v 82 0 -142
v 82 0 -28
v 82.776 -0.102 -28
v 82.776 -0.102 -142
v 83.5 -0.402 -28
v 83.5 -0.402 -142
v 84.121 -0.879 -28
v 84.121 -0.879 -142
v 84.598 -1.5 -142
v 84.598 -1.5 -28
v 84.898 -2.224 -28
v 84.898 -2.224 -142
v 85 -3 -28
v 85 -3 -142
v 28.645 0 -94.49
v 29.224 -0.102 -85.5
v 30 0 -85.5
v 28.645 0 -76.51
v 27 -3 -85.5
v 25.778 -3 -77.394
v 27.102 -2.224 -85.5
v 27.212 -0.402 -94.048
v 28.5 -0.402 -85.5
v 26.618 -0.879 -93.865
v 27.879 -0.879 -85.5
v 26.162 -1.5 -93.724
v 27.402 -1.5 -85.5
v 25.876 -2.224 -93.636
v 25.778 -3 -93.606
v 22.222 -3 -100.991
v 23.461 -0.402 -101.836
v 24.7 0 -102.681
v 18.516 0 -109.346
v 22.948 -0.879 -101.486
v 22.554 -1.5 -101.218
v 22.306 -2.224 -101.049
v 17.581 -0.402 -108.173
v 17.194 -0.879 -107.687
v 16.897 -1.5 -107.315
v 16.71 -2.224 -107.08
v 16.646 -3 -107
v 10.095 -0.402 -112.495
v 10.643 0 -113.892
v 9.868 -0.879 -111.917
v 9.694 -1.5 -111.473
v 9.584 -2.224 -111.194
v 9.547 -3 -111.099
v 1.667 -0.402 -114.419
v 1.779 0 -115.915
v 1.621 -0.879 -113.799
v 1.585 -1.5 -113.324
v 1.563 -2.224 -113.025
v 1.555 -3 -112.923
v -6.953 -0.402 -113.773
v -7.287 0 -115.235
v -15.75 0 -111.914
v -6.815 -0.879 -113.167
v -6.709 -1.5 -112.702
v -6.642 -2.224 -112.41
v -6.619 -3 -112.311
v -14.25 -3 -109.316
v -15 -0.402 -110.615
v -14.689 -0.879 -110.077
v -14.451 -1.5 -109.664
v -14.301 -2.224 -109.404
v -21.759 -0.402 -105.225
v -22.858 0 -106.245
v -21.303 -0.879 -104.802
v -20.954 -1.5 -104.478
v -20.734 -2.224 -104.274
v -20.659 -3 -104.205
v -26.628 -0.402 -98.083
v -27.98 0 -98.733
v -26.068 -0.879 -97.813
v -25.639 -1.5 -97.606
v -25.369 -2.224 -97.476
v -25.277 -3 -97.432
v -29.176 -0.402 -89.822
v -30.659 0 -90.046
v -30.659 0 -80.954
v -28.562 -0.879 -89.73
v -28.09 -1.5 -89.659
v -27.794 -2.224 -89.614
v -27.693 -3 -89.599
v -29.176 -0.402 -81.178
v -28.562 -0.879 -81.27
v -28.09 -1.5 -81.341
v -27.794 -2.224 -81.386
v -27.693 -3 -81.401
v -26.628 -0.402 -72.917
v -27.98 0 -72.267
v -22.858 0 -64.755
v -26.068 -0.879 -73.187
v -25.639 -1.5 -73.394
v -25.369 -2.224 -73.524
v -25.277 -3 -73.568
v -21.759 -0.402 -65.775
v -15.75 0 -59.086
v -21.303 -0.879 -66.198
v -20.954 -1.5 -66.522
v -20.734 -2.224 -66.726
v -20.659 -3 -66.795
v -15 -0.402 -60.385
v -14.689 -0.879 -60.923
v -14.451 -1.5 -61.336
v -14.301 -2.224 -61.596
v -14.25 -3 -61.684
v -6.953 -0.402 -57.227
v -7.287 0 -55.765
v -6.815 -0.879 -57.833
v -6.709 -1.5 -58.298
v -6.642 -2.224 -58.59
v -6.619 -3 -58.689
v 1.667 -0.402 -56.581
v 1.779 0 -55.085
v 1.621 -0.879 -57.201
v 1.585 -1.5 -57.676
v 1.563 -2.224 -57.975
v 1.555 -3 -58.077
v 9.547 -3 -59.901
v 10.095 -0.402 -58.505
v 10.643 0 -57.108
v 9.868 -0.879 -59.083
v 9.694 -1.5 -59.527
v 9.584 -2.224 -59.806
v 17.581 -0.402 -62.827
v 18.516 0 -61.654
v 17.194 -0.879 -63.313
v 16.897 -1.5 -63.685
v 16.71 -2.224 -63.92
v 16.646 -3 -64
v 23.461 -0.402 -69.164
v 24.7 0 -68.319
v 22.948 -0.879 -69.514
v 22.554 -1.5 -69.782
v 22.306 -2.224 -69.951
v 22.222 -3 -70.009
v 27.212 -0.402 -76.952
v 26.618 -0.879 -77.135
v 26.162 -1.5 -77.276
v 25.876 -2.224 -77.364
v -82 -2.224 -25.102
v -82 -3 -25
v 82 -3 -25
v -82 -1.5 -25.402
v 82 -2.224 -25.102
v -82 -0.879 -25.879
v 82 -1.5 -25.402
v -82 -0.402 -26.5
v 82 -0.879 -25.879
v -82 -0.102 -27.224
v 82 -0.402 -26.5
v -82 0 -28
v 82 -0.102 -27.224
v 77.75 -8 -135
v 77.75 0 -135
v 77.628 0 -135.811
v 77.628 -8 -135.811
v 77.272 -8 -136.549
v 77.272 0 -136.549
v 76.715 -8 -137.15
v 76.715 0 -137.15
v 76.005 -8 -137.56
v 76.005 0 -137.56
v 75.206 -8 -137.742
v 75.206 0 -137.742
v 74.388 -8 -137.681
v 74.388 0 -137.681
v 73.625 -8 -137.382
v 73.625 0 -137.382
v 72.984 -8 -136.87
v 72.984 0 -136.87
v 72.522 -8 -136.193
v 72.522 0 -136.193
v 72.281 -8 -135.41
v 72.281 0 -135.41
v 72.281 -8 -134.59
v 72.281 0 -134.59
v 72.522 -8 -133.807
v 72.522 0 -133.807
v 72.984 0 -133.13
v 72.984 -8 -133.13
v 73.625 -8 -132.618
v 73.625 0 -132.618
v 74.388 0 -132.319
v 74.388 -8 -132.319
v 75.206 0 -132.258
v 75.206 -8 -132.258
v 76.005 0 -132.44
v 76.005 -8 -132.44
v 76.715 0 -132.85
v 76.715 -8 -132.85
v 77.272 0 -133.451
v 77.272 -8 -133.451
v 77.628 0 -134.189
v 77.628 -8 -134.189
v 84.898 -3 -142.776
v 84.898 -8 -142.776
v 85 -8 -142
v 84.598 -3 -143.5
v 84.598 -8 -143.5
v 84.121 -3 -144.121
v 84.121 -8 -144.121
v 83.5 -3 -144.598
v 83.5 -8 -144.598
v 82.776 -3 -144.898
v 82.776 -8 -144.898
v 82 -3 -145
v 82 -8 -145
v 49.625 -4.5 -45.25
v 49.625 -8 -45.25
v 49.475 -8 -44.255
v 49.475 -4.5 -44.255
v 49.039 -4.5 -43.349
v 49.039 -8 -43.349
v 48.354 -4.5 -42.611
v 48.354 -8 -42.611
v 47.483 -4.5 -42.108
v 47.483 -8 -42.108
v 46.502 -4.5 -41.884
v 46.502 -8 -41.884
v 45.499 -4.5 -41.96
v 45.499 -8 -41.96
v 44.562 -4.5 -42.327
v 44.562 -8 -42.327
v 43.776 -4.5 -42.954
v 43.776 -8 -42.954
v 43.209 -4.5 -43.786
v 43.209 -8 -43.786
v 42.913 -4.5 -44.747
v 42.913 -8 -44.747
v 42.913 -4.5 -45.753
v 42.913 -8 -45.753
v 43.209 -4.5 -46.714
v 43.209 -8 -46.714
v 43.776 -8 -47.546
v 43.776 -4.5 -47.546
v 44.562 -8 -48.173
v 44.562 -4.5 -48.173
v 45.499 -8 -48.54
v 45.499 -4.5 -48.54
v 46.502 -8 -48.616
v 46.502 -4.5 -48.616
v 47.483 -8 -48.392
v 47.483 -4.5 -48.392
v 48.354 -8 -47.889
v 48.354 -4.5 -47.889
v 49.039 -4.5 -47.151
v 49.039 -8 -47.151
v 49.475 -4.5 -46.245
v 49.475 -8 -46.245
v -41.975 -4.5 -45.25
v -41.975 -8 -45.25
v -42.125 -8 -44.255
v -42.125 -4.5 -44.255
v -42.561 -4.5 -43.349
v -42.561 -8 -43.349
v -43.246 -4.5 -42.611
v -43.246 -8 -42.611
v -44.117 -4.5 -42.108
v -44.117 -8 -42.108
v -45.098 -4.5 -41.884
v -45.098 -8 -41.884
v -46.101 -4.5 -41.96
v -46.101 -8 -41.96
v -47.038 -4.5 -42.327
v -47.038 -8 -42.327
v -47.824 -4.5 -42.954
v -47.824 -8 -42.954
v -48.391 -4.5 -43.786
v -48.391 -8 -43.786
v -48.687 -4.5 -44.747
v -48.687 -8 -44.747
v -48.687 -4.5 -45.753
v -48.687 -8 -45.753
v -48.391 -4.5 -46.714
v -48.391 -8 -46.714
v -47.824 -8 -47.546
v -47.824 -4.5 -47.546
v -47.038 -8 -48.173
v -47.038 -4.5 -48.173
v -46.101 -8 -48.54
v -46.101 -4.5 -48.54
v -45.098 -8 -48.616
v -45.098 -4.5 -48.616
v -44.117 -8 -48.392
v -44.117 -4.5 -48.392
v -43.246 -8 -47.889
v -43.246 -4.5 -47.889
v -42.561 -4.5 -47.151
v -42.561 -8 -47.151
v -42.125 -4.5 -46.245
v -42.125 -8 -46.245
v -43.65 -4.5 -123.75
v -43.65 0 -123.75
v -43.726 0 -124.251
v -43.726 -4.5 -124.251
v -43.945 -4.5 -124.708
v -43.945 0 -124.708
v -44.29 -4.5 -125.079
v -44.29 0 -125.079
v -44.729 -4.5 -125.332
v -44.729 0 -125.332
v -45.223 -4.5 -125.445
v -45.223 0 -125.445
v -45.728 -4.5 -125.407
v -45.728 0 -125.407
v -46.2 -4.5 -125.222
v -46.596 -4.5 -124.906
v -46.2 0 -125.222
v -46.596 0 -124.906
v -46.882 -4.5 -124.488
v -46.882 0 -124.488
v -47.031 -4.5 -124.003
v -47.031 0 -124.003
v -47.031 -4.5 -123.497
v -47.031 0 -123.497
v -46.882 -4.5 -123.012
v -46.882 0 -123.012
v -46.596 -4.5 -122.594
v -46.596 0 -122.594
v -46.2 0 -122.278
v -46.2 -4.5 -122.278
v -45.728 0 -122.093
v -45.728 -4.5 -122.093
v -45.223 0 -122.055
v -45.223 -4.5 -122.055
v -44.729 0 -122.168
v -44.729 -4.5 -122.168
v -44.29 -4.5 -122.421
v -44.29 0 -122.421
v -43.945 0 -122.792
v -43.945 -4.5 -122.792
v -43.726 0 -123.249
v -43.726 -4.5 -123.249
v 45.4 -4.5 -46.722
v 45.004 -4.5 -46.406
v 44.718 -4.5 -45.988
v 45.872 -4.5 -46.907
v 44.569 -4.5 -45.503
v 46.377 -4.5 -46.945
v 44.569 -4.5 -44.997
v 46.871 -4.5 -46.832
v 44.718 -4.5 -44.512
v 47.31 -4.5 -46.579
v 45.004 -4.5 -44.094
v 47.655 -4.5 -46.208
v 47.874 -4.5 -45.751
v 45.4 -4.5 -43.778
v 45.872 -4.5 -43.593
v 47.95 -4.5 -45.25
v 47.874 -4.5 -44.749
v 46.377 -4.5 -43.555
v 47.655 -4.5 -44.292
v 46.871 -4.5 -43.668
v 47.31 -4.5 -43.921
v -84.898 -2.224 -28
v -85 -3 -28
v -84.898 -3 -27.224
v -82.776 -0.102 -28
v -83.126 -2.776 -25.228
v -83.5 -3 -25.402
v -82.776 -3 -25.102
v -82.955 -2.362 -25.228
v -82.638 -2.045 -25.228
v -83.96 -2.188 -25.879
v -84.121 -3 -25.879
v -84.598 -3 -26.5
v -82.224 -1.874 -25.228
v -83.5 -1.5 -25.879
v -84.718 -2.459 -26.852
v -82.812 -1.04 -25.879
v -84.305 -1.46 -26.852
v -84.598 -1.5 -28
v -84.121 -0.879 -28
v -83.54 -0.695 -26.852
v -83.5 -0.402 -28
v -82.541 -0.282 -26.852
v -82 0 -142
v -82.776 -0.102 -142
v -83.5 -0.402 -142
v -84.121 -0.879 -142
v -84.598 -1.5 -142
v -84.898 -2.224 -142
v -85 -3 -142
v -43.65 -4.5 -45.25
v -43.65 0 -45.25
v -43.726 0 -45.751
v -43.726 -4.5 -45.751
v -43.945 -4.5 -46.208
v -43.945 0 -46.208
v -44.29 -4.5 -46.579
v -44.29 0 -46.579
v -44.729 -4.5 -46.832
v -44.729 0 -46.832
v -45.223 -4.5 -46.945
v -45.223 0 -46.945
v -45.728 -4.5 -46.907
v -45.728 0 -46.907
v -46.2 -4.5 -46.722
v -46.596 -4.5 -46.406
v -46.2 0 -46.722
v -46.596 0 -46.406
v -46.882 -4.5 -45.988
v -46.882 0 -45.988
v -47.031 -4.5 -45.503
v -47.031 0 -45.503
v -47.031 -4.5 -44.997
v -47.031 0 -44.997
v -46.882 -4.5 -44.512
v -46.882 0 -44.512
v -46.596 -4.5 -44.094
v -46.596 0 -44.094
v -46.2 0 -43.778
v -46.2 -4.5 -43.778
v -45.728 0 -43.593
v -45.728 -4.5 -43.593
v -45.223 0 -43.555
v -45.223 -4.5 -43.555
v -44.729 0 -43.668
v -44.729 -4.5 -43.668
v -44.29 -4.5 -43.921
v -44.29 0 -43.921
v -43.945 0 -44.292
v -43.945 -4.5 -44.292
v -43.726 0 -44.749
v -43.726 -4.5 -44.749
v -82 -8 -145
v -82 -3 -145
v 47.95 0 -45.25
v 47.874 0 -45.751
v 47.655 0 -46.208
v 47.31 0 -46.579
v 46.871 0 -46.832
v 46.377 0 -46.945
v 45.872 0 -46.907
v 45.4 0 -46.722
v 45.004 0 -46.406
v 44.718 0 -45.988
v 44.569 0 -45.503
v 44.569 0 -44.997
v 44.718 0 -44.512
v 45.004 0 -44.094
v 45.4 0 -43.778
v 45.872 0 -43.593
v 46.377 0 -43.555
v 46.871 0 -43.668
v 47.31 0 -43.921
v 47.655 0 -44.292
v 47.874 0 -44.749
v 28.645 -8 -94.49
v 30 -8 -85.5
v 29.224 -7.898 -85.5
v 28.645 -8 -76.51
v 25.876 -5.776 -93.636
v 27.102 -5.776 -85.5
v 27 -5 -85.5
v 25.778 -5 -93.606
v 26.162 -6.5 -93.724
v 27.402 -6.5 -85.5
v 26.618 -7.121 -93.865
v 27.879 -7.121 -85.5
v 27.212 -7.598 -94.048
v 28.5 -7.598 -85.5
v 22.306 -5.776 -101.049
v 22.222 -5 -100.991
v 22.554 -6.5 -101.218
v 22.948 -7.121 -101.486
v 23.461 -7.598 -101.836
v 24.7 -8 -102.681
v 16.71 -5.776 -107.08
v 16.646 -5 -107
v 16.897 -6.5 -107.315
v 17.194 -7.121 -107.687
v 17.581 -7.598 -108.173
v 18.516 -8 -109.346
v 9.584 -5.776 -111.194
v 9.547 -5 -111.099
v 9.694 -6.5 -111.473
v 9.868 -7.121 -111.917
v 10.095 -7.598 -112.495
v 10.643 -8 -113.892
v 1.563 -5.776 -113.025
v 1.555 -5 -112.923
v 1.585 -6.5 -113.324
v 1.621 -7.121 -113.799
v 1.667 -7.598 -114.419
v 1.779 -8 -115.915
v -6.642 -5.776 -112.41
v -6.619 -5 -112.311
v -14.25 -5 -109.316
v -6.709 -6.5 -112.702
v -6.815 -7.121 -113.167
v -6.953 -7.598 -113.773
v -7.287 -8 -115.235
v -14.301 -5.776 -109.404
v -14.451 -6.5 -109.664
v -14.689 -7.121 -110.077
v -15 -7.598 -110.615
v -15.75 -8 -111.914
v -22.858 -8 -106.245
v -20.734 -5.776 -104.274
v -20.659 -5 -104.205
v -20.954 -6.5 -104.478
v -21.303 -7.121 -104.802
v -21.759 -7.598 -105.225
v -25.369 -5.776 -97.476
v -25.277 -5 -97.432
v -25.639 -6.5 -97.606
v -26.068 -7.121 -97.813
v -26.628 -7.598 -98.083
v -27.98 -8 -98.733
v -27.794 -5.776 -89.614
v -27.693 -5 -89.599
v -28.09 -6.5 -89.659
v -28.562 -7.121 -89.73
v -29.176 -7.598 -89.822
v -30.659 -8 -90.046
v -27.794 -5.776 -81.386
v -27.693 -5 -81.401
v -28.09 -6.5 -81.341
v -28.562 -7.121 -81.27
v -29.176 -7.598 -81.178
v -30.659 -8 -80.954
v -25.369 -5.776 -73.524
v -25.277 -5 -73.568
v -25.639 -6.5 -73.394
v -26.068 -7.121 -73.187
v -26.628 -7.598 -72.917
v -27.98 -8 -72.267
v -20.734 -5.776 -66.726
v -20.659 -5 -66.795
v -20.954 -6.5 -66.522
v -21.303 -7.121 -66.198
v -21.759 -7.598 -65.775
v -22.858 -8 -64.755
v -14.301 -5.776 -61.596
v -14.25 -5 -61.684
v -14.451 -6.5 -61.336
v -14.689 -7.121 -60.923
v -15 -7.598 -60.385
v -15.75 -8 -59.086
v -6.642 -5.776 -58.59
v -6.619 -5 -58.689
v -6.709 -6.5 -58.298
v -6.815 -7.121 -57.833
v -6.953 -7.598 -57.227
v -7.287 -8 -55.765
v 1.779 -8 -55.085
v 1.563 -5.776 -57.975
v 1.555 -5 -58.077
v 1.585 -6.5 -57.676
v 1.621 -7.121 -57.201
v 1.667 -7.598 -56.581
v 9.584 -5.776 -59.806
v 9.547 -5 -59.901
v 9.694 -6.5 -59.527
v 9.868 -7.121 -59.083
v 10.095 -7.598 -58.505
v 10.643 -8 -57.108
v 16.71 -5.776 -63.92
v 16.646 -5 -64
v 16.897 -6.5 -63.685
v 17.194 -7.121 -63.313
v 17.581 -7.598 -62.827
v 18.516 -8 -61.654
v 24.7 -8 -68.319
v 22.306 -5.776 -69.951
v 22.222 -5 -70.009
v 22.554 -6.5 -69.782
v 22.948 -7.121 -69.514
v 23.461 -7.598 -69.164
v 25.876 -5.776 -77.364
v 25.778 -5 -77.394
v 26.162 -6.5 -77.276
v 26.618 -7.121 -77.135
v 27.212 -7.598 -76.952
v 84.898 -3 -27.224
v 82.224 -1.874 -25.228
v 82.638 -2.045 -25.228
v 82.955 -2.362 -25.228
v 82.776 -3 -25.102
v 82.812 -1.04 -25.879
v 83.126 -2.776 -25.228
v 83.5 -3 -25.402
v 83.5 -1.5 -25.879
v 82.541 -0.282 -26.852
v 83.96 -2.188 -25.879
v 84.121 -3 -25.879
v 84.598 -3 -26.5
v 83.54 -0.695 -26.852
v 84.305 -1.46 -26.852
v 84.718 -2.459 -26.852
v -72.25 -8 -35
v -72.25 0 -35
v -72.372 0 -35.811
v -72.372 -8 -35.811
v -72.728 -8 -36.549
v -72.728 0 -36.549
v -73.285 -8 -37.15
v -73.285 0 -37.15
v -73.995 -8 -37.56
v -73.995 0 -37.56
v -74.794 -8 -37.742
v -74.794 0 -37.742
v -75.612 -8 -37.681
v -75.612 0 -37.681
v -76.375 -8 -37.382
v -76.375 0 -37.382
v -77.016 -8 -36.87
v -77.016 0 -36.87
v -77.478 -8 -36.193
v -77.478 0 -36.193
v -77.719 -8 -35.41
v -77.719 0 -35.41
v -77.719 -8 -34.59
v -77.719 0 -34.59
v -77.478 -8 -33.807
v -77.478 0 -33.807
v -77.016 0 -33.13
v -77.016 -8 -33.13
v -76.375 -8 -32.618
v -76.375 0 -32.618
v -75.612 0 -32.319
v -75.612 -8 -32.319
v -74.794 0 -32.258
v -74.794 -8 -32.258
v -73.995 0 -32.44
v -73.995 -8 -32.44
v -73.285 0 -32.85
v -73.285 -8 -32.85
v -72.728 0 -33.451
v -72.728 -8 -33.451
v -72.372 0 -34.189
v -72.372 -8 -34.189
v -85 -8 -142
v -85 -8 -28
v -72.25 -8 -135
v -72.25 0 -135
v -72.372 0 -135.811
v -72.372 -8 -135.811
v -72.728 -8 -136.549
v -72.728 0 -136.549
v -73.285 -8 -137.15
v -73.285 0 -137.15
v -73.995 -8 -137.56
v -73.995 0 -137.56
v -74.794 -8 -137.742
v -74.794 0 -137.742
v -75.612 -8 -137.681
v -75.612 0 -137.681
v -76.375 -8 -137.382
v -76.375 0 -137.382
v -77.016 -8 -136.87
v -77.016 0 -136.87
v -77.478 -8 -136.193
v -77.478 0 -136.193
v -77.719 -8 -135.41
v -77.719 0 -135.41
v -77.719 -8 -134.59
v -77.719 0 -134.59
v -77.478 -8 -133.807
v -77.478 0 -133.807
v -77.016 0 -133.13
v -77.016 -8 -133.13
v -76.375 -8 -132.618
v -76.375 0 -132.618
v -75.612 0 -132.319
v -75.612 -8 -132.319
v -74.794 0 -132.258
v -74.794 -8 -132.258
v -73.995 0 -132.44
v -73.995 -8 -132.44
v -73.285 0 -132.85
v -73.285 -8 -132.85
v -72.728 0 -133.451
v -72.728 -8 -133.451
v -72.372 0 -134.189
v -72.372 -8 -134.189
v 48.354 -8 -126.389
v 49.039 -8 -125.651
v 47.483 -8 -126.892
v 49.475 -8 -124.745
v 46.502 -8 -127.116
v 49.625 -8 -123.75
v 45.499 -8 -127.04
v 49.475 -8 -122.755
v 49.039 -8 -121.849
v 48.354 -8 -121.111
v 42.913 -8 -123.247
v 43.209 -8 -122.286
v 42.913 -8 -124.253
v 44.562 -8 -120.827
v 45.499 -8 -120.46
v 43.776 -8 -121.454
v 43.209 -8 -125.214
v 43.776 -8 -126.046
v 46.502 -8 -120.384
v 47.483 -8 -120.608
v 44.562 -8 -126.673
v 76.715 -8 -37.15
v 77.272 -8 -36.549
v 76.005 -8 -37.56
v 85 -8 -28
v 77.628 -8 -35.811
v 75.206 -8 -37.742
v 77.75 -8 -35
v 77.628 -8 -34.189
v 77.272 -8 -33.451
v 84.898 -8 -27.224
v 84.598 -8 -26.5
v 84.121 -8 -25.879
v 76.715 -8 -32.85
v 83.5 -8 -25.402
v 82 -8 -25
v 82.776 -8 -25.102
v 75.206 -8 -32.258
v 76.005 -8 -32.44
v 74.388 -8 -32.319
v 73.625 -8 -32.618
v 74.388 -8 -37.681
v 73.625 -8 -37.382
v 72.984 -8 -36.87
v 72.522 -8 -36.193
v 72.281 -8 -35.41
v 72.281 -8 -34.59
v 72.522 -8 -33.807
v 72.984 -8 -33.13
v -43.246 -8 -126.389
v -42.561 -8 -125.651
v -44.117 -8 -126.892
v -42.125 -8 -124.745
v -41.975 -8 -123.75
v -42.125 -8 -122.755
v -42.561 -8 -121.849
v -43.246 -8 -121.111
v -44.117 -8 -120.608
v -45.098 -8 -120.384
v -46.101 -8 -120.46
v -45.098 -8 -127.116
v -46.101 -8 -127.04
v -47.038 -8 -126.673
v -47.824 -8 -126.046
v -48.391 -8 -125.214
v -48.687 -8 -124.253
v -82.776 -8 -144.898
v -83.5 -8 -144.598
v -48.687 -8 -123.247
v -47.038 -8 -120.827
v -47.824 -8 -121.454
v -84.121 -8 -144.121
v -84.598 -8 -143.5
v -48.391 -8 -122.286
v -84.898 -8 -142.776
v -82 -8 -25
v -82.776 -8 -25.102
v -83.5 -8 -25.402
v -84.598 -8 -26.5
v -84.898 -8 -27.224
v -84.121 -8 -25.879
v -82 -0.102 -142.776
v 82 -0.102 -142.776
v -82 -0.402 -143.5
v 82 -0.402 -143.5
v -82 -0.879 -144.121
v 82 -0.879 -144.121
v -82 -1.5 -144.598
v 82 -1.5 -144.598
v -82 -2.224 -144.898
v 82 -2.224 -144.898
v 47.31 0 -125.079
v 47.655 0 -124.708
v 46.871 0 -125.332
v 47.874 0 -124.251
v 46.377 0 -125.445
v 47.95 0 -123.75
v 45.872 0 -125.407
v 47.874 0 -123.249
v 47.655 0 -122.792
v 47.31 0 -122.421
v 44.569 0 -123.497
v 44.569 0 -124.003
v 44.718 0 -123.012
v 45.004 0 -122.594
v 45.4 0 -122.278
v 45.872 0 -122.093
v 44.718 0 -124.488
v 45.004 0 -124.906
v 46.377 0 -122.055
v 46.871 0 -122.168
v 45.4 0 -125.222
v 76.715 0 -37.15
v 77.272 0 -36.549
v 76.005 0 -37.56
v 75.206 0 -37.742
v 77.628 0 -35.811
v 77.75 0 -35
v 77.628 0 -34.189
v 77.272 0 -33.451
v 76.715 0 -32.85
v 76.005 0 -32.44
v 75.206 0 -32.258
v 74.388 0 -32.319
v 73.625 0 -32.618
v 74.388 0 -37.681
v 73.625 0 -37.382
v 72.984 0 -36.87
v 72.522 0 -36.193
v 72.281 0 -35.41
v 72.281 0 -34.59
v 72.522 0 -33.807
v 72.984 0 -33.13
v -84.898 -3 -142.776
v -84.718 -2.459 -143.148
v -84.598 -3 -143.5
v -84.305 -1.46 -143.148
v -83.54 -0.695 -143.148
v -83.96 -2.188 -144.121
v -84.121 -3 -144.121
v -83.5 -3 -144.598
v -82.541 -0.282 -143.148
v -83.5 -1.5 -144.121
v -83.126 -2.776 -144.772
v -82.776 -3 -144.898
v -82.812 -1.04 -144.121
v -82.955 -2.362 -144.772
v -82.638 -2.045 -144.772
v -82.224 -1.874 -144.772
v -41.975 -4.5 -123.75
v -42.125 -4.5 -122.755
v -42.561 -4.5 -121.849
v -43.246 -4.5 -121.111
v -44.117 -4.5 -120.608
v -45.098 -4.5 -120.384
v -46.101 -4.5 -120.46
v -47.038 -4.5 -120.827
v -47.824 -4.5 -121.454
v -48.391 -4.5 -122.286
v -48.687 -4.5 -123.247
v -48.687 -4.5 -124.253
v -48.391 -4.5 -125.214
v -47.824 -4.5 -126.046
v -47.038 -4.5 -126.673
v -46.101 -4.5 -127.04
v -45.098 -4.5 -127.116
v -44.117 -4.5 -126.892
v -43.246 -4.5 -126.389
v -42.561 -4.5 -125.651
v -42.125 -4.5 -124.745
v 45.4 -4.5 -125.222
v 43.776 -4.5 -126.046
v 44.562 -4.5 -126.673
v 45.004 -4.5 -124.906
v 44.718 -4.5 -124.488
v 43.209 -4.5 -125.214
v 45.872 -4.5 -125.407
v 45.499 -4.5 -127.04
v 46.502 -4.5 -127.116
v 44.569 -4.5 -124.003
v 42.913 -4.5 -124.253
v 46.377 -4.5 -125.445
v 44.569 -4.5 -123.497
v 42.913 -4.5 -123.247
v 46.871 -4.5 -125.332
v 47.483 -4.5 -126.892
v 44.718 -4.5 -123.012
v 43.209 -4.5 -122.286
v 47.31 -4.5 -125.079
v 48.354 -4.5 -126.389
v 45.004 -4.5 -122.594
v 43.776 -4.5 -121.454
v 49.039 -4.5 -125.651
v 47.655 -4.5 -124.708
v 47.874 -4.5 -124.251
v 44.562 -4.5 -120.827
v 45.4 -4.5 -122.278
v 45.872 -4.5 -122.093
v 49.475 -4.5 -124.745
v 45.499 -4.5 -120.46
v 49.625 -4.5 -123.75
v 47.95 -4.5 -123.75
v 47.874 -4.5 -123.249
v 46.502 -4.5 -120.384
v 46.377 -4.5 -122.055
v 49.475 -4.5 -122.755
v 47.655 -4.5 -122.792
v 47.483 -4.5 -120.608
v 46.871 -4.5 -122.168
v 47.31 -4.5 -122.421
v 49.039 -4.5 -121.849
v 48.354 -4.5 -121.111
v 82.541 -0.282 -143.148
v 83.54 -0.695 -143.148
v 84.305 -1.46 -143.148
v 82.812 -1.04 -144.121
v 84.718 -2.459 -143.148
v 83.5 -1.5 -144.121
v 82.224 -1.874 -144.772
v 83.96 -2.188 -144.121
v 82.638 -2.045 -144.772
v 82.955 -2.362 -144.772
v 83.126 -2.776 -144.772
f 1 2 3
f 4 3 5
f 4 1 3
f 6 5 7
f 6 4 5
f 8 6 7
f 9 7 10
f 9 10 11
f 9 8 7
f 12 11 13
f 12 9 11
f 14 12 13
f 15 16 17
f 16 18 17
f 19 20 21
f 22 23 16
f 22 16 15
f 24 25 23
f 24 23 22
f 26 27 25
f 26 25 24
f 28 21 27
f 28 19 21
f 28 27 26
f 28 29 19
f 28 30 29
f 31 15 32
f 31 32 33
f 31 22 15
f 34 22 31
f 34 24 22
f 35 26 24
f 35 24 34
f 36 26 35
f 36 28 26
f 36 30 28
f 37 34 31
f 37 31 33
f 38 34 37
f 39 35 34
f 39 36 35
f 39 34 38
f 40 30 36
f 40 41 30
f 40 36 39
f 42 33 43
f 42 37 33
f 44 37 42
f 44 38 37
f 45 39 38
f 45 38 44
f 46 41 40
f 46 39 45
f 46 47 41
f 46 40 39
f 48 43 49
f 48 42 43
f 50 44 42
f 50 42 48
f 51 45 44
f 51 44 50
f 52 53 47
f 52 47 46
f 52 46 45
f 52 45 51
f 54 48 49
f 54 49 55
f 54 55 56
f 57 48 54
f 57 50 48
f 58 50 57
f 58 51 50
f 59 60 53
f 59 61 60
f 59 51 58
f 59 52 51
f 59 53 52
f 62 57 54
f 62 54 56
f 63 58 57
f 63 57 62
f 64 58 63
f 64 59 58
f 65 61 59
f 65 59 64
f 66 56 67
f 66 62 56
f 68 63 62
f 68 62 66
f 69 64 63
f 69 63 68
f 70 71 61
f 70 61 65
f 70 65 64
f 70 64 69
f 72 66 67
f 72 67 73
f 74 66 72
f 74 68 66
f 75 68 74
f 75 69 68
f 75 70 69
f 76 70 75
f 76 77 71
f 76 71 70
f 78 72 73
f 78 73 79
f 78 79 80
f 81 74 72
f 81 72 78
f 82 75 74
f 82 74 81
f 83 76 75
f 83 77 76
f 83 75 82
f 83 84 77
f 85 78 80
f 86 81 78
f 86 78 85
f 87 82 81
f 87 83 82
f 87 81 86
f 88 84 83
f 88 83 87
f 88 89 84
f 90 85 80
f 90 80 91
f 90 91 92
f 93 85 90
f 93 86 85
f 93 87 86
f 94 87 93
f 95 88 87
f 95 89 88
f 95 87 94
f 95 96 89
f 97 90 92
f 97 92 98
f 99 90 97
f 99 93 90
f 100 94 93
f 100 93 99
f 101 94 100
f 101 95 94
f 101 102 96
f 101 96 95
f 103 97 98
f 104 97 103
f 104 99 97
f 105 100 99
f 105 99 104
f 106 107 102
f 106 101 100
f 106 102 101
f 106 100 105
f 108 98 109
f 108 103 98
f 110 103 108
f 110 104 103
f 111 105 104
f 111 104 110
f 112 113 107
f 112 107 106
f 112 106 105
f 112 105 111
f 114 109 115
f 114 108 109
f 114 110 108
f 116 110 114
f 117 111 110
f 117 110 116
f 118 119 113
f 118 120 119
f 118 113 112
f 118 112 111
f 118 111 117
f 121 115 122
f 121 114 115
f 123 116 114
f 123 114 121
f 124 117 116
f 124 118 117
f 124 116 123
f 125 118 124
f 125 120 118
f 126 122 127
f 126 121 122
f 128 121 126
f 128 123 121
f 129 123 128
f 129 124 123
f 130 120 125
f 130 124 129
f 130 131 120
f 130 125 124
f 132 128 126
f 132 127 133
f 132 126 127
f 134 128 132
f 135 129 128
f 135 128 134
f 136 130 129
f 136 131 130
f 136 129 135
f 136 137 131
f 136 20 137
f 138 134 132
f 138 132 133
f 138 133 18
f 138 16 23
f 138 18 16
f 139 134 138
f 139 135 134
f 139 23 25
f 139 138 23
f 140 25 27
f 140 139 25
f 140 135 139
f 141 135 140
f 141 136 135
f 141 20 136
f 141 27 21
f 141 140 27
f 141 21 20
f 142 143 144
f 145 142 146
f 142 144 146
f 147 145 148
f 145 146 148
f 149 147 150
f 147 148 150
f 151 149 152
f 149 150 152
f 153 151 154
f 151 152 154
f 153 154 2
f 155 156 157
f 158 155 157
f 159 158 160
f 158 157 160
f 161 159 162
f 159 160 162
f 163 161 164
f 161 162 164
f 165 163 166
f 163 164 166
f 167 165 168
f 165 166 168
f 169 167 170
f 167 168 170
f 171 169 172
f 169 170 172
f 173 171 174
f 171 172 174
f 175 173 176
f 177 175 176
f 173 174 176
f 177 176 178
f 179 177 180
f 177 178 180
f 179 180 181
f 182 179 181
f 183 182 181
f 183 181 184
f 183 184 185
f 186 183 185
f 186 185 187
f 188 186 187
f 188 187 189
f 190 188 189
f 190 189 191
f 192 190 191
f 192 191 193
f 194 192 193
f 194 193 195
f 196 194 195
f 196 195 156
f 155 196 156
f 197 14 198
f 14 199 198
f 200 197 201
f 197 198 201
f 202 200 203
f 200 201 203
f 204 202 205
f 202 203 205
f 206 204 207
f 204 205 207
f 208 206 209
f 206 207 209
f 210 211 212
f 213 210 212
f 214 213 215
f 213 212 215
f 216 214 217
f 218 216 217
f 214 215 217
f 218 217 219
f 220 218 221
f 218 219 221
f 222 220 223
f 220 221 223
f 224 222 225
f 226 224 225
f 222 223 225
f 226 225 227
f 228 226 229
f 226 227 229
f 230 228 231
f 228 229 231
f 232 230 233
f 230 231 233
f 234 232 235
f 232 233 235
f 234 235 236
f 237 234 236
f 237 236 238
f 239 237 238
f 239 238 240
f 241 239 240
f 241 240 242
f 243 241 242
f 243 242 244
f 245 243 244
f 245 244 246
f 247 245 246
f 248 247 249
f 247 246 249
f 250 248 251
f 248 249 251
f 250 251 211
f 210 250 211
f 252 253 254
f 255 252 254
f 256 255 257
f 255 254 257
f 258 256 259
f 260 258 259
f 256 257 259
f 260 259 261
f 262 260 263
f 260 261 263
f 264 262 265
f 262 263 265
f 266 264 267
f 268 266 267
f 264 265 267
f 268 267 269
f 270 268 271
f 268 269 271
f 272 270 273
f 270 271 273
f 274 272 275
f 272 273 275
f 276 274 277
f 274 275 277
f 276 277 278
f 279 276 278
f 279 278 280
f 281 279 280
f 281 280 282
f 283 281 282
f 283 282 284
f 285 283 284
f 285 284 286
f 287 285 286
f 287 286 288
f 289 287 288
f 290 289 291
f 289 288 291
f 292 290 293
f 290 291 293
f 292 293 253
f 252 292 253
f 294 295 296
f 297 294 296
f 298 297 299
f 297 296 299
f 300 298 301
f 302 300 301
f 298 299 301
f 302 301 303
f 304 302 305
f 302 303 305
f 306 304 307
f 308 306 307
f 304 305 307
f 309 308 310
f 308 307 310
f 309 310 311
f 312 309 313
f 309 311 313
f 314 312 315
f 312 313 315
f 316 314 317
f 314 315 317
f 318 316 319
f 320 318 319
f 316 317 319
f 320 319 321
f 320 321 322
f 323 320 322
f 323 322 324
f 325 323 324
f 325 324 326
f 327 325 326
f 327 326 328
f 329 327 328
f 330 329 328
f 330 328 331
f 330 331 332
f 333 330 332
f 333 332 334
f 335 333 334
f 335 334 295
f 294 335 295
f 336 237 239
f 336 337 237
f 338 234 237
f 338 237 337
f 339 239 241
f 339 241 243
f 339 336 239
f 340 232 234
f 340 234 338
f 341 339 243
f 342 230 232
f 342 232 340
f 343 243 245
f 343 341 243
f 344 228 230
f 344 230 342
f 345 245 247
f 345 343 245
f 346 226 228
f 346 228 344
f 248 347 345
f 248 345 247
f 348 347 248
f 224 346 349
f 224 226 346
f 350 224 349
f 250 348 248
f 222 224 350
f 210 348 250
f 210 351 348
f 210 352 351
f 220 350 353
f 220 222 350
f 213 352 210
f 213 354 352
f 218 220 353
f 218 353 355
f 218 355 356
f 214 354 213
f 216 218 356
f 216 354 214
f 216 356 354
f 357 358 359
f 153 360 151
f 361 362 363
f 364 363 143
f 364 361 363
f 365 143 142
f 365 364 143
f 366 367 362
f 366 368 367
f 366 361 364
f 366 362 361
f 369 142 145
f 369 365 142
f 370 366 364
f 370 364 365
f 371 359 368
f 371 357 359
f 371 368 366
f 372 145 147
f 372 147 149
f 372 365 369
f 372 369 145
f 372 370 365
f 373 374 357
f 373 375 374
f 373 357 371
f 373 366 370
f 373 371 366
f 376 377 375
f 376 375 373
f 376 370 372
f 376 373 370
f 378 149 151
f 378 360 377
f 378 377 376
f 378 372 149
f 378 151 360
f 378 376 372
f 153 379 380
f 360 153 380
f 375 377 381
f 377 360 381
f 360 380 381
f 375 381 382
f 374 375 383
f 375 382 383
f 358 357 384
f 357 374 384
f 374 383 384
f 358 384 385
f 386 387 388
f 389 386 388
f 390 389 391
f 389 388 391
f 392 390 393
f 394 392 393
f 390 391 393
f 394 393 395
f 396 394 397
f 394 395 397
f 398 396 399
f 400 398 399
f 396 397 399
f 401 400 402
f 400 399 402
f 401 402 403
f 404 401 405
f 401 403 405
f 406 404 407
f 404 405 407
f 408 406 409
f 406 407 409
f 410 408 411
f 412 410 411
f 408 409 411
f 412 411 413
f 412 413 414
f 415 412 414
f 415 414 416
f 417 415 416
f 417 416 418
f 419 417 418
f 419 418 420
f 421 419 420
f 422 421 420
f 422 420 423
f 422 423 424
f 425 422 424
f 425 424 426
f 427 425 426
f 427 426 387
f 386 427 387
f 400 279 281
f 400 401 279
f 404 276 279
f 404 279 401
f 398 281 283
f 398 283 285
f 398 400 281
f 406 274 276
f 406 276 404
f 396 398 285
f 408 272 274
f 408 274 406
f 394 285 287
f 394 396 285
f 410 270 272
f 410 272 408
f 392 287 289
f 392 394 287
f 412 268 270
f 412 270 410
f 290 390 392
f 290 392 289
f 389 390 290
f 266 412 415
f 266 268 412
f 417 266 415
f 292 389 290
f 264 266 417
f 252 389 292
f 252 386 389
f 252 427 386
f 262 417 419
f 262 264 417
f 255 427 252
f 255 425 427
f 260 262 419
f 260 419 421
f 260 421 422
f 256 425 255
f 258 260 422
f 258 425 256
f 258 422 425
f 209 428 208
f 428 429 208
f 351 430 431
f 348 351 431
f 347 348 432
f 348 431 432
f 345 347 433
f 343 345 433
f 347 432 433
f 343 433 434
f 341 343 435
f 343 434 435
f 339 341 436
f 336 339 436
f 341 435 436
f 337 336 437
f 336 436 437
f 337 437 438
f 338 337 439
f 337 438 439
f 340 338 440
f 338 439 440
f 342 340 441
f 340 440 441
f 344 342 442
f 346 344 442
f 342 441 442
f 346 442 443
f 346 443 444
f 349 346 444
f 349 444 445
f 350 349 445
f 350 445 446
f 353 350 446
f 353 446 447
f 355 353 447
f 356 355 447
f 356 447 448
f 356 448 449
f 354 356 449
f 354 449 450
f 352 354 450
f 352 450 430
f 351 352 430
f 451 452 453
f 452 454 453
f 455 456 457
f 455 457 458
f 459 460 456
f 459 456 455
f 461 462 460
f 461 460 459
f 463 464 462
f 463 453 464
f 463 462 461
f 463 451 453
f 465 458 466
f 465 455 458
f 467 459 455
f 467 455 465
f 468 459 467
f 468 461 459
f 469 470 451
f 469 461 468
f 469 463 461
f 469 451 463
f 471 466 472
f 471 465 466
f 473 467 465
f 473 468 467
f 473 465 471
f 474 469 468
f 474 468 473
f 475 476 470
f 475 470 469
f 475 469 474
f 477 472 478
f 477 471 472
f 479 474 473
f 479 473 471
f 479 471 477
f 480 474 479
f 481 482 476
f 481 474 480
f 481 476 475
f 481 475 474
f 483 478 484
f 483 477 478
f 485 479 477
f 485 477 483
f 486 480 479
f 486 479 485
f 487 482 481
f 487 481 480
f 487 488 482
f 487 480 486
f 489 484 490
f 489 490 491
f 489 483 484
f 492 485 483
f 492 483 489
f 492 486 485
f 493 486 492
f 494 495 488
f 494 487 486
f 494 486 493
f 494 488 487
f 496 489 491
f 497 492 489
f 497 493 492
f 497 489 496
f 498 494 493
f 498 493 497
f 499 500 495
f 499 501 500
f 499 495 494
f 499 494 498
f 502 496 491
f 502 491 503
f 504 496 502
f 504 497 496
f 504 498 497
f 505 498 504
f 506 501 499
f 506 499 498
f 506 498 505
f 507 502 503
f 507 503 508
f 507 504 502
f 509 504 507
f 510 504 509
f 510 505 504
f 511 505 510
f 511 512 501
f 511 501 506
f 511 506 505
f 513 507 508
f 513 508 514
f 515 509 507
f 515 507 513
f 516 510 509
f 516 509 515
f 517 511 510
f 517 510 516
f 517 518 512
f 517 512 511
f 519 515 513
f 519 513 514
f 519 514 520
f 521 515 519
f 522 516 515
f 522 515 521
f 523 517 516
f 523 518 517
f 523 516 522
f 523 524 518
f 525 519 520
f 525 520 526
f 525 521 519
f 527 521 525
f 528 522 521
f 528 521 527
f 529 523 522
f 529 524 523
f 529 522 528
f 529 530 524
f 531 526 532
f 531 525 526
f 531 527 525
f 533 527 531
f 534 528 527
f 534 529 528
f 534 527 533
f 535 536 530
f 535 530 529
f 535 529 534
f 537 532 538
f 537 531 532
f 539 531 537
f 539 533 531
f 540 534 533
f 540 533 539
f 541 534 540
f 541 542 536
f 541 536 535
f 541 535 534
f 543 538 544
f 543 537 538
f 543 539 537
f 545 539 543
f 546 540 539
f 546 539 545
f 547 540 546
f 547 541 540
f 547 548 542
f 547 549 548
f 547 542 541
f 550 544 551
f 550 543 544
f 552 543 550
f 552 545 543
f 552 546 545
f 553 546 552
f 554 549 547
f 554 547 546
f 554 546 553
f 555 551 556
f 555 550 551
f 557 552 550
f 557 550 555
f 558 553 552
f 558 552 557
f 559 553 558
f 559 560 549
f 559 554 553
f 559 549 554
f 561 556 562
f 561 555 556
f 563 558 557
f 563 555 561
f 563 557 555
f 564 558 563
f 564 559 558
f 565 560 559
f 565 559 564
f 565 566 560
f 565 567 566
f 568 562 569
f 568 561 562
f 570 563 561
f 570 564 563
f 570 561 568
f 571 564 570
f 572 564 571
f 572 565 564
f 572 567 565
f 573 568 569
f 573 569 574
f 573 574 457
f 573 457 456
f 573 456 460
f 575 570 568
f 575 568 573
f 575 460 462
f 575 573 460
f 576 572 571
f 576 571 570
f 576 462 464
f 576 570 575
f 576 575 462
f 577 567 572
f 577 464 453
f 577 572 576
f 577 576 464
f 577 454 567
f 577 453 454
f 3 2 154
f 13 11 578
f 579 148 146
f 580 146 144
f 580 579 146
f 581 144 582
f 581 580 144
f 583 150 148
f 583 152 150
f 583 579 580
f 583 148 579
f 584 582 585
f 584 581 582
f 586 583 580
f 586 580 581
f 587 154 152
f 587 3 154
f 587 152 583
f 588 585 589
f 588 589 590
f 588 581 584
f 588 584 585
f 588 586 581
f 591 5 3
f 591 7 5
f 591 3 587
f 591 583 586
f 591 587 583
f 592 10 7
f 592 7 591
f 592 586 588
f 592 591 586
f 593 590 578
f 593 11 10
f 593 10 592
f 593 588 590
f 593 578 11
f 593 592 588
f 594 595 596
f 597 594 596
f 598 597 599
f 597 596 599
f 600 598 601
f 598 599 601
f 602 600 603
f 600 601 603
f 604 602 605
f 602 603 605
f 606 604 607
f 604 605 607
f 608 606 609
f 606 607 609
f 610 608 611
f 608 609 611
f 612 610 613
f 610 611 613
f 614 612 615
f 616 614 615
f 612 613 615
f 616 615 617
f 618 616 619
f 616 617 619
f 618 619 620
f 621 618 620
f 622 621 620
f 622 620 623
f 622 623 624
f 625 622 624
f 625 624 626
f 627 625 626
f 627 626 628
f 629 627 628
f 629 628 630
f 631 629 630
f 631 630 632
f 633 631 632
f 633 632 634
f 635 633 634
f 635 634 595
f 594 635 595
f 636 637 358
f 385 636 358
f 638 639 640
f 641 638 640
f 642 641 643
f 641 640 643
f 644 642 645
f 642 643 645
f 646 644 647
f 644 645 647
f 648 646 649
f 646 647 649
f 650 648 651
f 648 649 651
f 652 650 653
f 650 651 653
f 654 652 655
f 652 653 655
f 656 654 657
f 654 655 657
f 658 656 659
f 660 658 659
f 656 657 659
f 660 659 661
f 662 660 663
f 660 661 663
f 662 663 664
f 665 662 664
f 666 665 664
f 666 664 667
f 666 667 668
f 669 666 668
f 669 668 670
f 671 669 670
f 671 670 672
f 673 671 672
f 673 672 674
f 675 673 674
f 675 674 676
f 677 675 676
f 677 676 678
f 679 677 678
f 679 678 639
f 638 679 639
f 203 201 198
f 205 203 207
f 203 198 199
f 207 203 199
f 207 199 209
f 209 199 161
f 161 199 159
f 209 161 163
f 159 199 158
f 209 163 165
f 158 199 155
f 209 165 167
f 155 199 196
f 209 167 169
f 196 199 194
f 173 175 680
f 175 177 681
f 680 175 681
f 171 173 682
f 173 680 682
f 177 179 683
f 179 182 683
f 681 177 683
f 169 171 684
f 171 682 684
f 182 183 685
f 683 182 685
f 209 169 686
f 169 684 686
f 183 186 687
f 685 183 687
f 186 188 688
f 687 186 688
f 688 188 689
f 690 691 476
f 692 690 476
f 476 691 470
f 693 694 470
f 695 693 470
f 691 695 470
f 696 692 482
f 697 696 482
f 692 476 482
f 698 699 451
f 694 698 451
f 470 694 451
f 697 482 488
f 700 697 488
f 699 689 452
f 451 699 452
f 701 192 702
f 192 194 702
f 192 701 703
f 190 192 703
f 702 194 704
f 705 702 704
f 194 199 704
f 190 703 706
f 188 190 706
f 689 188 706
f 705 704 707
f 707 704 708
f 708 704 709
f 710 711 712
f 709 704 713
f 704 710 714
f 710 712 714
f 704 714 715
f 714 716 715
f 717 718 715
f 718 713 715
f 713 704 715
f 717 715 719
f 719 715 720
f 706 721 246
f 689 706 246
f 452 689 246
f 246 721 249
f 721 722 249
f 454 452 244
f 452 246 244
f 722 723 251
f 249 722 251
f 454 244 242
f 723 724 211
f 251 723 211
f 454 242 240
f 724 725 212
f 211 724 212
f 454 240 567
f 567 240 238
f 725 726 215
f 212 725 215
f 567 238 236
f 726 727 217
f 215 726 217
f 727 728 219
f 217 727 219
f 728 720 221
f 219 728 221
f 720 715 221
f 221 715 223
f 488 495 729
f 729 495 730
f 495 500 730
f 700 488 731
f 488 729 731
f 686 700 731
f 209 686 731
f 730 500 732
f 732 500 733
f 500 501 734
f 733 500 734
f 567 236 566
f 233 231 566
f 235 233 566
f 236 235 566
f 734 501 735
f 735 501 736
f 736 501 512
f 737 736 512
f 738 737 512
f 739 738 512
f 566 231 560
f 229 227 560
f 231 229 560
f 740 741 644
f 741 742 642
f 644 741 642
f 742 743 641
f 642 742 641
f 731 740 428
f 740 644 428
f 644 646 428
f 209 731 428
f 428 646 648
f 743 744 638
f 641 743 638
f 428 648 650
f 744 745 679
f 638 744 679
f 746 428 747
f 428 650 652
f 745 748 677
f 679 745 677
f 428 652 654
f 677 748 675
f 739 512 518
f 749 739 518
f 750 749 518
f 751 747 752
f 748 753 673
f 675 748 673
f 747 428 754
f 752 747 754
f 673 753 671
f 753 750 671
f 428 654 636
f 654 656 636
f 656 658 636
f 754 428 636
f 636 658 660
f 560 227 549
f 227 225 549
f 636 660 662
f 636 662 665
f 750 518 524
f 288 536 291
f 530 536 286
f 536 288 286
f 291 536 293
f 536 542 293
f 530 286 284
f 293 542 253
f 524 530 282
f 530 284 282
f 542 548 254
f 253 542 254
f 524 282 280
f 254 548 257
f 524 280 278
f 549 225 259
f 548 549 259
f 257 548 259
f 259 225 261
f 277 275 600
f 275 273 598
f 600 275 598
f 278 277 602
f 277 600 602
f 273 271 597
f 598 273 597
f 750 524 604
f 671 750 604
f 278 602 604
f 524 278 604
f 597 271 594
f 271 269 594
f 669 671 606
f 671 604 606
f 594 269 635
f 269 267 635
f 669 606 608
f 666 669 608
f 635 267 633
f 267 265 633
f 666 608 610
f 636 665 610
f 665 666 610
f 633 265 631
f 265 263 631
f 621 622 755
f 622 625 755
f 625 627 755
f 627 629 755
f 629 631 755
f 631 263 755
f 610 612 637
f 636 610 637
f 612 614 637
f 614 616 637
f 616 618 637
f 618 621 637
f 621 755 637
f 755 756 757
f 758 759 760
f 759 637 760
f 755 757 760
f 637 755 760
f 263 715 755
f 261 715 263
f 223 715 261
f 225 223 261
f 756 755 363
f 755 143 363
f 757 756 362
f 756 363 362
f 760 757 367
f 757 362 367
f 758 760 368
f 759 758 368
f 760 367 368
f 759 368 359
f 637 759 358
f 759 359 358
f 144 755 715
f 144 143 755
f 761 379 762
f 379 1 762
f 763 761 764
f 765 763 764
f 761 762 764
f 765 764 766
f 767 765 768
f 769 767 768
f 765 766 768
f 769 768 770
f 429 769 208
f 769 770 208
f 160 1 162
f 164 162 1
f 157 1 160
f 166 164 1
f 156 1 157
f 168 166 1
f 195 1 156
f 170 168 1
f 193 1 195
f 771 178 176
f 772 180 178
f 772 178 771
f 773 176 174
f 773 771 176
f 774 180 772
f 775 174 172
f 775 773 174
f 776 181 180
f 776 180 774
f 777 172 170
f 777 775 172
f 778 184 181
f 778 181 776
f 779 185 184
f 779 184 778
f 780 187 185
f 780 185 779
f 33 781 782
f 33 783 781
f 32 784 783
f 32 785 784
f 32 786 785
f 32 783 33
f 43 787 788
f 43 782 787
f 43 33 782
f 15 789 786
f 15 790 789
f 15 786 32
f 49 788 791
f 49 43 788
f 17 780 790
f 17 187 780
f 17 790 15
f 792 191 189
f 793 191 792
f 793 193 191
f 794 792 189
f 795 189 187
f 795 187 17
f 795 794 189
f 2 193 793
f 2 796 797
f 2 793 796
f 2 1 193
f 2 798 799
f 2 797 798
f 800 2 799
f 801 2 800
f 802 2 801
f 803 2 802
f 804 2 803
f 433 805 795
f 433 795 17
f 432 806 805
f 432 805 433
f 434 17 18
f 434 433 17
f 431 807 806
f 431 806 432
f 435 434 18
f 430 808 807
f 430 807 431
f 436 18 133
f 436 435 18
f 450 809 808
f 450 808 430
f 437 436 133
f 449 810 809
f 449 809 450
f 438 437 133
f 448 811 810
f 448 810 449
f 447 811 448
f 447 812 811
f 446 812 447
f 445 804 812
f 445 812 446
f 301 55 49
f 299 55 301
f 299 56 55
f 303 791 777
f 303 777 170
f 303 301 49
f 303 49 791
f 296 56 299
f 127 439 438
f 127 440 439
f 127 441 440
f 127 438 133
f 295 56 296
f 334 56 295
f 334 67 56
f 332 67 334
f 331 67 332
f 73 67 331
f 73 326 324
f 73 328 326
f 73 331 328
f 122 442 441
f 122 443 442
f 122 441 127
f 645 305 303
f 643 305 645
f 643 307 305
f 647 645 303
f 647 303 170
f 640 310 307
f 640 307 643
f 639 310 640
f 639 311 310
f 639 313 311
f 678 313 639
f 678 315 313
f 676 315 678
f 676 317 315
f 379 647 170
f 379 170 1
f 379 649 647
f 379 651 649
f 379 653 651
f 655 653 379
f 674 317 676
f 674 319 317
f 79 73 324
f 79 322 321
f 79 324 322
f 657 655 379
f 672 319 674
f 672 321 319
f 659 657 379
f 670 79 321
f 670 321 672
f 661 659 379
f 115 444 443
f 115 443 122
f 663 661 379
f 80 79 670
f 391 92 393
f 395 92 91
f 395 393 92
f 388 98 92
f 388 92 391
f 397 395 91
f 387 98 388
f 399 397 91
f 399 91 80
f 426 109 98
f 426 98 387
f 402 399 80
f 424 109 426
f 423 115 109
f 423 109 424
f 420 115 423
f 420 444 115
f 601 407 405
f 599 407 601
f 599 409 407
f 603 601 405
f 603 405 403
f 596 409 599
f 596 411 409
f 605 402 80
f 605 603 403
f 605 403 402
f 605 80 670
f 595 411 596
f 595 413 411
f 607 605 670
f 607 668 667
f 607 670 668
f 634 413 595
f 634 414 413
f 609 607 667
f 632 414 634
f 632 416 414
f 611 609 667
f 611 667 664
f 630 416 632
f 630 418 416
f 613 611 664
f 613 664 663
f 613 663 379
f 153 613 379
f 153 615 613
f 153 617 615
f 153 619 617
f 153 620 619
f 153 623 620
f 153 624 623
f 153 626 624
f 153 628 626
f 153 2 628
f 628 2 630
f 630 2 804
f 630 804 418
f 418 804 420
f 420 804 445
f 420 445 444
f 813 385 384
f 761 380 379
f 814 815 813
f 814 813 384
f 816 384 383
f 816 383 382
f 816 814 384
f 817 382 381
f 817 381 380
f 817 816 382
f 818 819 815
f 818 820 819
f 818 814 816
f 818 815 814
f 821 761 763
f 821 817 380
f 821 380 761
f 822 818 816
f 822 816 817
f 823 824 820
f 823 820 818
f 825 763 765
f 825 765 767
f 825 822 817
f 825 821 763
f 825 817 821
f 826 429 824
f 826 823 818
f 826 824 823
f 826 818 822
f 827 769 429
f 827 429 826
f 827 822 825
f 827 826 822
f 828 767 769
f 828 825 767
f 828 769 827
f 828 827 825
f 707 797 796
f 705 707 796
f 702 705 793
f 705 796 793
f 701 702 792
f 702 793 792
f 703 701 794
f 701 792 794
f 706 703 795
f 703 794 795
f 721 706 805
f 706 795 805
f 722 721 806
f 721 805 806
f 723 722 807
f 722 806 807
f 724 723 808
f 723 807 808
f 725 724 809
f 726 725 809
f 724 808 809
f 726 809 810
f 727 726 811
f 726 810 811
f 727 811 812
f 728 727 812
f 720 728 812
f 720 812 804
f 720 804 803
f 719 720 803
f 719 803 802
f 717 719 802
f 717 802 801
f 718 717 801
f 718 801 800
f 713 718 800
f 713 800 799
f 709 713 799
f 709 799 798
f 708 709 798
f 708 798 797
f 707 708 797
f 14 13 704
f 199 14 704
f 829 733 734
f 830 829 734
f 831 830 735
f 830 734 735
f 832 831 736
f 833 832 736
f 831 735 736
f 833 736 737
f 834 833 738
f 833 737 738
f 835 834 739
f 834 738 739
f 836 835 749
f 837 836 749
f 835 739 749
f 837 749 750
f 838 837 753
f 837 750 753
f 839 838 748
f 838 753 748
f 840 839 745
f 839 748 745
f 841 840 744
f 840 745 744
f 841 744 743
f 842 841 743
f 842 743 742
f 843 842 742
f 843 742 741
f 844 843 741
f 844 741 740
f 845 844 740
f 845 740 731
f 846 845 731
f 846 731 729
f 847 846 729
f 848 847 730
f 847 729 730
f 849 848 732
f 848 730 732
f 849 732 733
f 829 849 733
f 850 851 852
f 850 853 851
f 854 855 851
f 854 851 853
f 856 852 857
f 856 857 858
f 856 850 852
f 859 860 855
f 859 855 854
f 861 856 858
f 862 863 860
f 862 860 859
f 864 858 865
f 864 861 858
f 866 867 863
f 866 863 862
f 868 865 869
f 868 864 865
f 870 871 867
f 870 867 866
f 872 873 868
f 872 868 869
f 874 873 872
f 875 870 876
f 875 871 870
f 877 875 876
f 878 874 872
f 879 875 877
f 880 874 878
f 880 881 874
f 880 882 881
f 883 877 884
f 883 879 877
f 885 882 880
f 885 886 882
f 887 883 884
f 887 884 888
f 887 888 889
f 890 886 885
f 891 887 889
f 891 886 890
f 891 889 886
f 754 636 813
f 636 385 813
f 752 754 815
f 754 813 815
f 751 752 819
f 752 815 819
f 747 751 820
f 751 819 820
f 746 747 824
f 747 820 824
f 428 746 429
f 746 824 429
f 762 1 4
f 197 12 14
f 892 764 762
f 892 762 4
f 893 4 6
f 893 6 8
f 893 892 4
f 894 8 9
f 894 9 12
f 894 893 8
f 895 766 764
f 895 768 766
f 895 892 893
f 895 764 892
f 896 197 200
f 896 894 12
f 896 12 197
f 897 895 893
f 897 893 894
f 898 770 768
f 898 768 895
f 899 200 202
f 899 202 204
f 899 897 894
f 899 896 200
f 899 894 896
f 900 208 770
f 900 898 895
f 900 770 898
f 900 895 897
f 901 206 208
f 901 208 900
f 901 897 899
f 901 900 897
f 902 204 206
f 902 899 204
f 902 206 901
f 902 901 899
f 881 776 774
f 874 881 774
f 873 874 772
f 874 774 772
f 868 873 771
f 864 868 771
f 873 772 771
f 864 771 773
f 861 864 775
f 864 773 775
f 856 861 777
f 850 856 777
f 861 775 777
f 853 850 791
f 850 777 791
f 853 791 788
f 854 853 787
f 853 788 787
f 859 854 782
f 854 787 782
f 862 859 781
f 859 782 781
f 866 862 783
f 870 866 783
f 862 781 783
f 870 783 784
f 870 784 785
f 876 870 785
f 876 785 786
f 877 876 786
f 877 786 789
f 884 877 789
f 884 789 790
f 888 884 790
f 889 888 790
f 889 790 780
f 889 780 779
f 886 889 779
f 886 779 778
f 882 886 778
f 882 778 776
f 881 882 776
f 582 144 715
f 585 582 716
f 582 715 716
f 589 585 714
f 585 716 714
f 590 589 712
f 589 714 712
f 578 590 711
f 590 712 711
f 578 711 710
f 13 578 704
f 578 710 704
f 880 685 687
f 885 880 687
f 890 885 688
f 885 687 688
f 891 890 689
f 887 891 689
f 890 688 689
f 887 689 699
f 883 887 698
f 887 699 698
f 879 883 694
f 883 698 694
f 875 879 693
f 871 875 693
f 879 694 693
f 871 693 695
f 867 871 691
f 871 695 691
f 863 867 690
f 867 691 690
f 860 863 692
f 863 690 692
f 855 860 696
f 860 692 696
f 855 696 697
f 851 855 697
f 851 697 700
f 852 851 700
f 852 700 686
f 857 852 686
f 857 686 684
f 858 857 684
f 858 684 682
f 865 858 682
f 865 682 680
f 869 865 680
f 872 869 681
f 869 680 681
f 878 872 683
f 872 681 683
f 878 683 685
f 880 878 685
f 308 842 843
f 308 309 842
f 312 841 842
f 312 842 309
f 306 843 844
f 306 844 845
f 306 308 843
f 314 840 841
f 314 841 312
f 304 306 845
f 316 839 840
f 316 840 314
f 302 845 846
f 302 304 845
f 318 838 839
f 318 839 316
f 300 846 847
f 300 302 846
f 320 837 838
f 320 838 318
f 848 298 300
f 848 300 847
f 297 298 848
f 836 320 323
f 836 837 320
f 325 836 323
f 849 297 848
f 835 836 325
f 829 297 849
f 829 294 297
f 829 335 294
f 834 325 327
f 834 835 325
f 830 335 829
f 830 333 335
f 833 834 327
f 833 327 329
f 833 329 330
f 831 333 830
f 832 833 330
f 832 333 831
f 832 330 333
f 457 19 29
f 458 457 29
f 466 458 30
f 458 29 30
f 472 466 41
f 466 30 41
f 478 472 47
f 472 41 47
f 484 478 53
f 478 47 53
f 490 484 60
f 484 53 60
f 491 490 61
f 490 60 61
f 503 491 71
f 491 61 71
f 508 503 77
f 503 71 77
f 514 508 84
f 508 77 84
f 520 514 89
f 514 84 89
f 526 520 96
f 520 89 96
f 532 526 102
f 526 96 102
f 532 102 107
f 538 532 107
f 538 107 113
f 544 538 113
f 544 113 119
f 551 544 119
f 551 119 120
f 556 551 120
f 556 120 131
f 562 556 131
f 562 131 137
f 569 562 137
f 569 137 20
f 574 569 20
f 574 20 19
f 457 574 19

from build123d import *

# Parameters (mm, degrees)
BOSS_EXTRUDE1_DEPTH = 170
SKETCH2_R           = 2.75
CUT_EXTRUDE1_DEPTH  = 9
SKETCH3_R           = 1.7
CUT_EXTRUDE2_DEPTH  = 9
SKETCH4_R           = 3.375
CUT_EXTRUDE3_DEPTH  = 3.5
FILLET1_R           = 3
SKETCH5_R           = 27.5
CUT_EXTRUDE4_DEPTH  = 9
FILLET2_R           = 3
FILLET3_R           = 3
SKETCH6_W           = 170
SKETCH6_H           = 25
CUT_EXTRUDE5_DEPTH  = 9
FILLET4_R           = 3
FILLET5_R           = 3


with BuildPart() as part:
    # Sketch1 → Boss-Extrude1 (new body)
    with BuildSketch(Plane.XY):
        Polygon((-85, 0), (0, 0), (85, 0), (85, -8), (-85, -8), align=None)
    extrude(amount=-BOSS_EXTRUDE1_DEPTH)

    # Sketch2 → Cut-Extrude1 (cut, through all)
    with BuildSketch(Plane(origin=(0, 0, 0), x_dir=(1, 0, 0), z_dir=(0, 1, 0))):
        with Locations((-75, 35)):
            Circle(SKETCH2_R)
        with Locations((75, 35)):
            Circle(SKETCH2_R)
        with Locations((75, 135)):
            Circle(SKETCH2_R)
        with Locations((-75, 135)):
            Circle(SKETCH2_R)
    extrude(amount=-CUT_EXTRUDE1_DEPTH, mode=Mode.SUBTRACT)

    # Sketch3 → Cut-Extrude2 (cut, through all)
    with BuildSketch(Plane(origin=(0, 0, 0), x_dir=(1, 0, 0), z_dir=(0, 1, 0))):
        with Locations((-45.35, 45.25)):
            Circle(SKETCH3_R)
        with Locations((46.25, 45.25)):
            Circle(SKETCH3_R)
        with Locations((46.25, 123.75)):
            Circle(SKETCH3_R)
        with Locations((-45.35, 123.75)):
            Circle(SKETCH3_R)
    extrude(amount=-CUT_EXTRUDE2_DEPTH, mode=Mode.SUBTRACT)

    # Sketch4 → Cut-Extrude3 (cut)
    with BuildSketch(Plane.XZ.offset(8)):
        with Locations((-45.35, -45.25)):
            Circle(SKETCH4_R)
        with Locations((46.25, -45.25)):
            Circle(SKETCH4_R)
        with Locations((46.25, -123.75)):
            Circle(SKETCH4_R)
        with Locations((-45.35, -123.75)):
            Circle(SKETCH4_R)
    extrude(amount=-CUT_EXTRUDE3_DEPTH, mode=Mode.SUBTRACT)

    # Fillet1
    fillet1_edges = [part.edges().sort_by_distance(p)[0] for p in [
        (0, 0, -170),
        (0, 0, 0),
        (-85, 0, -85),
        (85, 0, -85),
    ]]
    fillet(fillet1_edges, radius=FILLET1_R)

    # Sketch5 → Cut-Extrude4 (cut, through all)
    with BuildSketch(Plane(origin=(0, 0, 0), x_dir=(1, 0, 0), z_dir=(0, 1, 0))):
        with Locations((-0.5, 85.5)):
            Circle(SKETCH5_R)
    extrude(amount=-CUT_EXTRUDE4_DEPTH, mode=Mode.SUBTRACT)

    # Fillet2
    fillet2_edges = [part.edges().sort_by_distance(p)[0] for p in [
        (-28, 0, -85.5),
    ]]
    fillet(fillet2_edges, radius=FILLET2_R)

    # Fillet3
    fillet3_edges = [part.edges().sort_by_distance(p)[0] for p in [
        (-28, -8, -85.5),
    ]]
    fillet(fillet3_edges, radius=FILLET3_R)

    # Sketch6 → Cut-Extrude5 (cut, through all)
    with BuildSketch(Plane(origin=(0, 0, 0), x_dir=(1, 0, 0), z_dir=(0, 1, 0))):
        with Locations((0, 157.5)):
            Rectangle(SKETCH6_W, SKETCH6_H)
        with Locations((0, 12.5)):
            Rectangle(SKETCH6_W, SKETCH6_H)
    extrude(amount=-CUT_EXTRUDE5_DEPTH, mode=Mode.SUBTRACT)

    # Fillet4
    fillet4_edges = [part.edges().sort_by_distance(p)[0] for p in [
        (0, 0, -145),
        (-85, -5.5, -145),
        (85, -5.5, -145),
    ]]
    fillet(fillet4_edges, radius=FILLET4_R)

    # Fillet5
    fillet5_edges = [part.edges().sort_by_distance(p)[0] for p in [
        (85, -5.5, -25),
        (-85, -5.5, -25),
        (0, 0, -25),
    ]]
    fillet(fillet5_edges, radius=FILLET5_R)


solid = part.part
